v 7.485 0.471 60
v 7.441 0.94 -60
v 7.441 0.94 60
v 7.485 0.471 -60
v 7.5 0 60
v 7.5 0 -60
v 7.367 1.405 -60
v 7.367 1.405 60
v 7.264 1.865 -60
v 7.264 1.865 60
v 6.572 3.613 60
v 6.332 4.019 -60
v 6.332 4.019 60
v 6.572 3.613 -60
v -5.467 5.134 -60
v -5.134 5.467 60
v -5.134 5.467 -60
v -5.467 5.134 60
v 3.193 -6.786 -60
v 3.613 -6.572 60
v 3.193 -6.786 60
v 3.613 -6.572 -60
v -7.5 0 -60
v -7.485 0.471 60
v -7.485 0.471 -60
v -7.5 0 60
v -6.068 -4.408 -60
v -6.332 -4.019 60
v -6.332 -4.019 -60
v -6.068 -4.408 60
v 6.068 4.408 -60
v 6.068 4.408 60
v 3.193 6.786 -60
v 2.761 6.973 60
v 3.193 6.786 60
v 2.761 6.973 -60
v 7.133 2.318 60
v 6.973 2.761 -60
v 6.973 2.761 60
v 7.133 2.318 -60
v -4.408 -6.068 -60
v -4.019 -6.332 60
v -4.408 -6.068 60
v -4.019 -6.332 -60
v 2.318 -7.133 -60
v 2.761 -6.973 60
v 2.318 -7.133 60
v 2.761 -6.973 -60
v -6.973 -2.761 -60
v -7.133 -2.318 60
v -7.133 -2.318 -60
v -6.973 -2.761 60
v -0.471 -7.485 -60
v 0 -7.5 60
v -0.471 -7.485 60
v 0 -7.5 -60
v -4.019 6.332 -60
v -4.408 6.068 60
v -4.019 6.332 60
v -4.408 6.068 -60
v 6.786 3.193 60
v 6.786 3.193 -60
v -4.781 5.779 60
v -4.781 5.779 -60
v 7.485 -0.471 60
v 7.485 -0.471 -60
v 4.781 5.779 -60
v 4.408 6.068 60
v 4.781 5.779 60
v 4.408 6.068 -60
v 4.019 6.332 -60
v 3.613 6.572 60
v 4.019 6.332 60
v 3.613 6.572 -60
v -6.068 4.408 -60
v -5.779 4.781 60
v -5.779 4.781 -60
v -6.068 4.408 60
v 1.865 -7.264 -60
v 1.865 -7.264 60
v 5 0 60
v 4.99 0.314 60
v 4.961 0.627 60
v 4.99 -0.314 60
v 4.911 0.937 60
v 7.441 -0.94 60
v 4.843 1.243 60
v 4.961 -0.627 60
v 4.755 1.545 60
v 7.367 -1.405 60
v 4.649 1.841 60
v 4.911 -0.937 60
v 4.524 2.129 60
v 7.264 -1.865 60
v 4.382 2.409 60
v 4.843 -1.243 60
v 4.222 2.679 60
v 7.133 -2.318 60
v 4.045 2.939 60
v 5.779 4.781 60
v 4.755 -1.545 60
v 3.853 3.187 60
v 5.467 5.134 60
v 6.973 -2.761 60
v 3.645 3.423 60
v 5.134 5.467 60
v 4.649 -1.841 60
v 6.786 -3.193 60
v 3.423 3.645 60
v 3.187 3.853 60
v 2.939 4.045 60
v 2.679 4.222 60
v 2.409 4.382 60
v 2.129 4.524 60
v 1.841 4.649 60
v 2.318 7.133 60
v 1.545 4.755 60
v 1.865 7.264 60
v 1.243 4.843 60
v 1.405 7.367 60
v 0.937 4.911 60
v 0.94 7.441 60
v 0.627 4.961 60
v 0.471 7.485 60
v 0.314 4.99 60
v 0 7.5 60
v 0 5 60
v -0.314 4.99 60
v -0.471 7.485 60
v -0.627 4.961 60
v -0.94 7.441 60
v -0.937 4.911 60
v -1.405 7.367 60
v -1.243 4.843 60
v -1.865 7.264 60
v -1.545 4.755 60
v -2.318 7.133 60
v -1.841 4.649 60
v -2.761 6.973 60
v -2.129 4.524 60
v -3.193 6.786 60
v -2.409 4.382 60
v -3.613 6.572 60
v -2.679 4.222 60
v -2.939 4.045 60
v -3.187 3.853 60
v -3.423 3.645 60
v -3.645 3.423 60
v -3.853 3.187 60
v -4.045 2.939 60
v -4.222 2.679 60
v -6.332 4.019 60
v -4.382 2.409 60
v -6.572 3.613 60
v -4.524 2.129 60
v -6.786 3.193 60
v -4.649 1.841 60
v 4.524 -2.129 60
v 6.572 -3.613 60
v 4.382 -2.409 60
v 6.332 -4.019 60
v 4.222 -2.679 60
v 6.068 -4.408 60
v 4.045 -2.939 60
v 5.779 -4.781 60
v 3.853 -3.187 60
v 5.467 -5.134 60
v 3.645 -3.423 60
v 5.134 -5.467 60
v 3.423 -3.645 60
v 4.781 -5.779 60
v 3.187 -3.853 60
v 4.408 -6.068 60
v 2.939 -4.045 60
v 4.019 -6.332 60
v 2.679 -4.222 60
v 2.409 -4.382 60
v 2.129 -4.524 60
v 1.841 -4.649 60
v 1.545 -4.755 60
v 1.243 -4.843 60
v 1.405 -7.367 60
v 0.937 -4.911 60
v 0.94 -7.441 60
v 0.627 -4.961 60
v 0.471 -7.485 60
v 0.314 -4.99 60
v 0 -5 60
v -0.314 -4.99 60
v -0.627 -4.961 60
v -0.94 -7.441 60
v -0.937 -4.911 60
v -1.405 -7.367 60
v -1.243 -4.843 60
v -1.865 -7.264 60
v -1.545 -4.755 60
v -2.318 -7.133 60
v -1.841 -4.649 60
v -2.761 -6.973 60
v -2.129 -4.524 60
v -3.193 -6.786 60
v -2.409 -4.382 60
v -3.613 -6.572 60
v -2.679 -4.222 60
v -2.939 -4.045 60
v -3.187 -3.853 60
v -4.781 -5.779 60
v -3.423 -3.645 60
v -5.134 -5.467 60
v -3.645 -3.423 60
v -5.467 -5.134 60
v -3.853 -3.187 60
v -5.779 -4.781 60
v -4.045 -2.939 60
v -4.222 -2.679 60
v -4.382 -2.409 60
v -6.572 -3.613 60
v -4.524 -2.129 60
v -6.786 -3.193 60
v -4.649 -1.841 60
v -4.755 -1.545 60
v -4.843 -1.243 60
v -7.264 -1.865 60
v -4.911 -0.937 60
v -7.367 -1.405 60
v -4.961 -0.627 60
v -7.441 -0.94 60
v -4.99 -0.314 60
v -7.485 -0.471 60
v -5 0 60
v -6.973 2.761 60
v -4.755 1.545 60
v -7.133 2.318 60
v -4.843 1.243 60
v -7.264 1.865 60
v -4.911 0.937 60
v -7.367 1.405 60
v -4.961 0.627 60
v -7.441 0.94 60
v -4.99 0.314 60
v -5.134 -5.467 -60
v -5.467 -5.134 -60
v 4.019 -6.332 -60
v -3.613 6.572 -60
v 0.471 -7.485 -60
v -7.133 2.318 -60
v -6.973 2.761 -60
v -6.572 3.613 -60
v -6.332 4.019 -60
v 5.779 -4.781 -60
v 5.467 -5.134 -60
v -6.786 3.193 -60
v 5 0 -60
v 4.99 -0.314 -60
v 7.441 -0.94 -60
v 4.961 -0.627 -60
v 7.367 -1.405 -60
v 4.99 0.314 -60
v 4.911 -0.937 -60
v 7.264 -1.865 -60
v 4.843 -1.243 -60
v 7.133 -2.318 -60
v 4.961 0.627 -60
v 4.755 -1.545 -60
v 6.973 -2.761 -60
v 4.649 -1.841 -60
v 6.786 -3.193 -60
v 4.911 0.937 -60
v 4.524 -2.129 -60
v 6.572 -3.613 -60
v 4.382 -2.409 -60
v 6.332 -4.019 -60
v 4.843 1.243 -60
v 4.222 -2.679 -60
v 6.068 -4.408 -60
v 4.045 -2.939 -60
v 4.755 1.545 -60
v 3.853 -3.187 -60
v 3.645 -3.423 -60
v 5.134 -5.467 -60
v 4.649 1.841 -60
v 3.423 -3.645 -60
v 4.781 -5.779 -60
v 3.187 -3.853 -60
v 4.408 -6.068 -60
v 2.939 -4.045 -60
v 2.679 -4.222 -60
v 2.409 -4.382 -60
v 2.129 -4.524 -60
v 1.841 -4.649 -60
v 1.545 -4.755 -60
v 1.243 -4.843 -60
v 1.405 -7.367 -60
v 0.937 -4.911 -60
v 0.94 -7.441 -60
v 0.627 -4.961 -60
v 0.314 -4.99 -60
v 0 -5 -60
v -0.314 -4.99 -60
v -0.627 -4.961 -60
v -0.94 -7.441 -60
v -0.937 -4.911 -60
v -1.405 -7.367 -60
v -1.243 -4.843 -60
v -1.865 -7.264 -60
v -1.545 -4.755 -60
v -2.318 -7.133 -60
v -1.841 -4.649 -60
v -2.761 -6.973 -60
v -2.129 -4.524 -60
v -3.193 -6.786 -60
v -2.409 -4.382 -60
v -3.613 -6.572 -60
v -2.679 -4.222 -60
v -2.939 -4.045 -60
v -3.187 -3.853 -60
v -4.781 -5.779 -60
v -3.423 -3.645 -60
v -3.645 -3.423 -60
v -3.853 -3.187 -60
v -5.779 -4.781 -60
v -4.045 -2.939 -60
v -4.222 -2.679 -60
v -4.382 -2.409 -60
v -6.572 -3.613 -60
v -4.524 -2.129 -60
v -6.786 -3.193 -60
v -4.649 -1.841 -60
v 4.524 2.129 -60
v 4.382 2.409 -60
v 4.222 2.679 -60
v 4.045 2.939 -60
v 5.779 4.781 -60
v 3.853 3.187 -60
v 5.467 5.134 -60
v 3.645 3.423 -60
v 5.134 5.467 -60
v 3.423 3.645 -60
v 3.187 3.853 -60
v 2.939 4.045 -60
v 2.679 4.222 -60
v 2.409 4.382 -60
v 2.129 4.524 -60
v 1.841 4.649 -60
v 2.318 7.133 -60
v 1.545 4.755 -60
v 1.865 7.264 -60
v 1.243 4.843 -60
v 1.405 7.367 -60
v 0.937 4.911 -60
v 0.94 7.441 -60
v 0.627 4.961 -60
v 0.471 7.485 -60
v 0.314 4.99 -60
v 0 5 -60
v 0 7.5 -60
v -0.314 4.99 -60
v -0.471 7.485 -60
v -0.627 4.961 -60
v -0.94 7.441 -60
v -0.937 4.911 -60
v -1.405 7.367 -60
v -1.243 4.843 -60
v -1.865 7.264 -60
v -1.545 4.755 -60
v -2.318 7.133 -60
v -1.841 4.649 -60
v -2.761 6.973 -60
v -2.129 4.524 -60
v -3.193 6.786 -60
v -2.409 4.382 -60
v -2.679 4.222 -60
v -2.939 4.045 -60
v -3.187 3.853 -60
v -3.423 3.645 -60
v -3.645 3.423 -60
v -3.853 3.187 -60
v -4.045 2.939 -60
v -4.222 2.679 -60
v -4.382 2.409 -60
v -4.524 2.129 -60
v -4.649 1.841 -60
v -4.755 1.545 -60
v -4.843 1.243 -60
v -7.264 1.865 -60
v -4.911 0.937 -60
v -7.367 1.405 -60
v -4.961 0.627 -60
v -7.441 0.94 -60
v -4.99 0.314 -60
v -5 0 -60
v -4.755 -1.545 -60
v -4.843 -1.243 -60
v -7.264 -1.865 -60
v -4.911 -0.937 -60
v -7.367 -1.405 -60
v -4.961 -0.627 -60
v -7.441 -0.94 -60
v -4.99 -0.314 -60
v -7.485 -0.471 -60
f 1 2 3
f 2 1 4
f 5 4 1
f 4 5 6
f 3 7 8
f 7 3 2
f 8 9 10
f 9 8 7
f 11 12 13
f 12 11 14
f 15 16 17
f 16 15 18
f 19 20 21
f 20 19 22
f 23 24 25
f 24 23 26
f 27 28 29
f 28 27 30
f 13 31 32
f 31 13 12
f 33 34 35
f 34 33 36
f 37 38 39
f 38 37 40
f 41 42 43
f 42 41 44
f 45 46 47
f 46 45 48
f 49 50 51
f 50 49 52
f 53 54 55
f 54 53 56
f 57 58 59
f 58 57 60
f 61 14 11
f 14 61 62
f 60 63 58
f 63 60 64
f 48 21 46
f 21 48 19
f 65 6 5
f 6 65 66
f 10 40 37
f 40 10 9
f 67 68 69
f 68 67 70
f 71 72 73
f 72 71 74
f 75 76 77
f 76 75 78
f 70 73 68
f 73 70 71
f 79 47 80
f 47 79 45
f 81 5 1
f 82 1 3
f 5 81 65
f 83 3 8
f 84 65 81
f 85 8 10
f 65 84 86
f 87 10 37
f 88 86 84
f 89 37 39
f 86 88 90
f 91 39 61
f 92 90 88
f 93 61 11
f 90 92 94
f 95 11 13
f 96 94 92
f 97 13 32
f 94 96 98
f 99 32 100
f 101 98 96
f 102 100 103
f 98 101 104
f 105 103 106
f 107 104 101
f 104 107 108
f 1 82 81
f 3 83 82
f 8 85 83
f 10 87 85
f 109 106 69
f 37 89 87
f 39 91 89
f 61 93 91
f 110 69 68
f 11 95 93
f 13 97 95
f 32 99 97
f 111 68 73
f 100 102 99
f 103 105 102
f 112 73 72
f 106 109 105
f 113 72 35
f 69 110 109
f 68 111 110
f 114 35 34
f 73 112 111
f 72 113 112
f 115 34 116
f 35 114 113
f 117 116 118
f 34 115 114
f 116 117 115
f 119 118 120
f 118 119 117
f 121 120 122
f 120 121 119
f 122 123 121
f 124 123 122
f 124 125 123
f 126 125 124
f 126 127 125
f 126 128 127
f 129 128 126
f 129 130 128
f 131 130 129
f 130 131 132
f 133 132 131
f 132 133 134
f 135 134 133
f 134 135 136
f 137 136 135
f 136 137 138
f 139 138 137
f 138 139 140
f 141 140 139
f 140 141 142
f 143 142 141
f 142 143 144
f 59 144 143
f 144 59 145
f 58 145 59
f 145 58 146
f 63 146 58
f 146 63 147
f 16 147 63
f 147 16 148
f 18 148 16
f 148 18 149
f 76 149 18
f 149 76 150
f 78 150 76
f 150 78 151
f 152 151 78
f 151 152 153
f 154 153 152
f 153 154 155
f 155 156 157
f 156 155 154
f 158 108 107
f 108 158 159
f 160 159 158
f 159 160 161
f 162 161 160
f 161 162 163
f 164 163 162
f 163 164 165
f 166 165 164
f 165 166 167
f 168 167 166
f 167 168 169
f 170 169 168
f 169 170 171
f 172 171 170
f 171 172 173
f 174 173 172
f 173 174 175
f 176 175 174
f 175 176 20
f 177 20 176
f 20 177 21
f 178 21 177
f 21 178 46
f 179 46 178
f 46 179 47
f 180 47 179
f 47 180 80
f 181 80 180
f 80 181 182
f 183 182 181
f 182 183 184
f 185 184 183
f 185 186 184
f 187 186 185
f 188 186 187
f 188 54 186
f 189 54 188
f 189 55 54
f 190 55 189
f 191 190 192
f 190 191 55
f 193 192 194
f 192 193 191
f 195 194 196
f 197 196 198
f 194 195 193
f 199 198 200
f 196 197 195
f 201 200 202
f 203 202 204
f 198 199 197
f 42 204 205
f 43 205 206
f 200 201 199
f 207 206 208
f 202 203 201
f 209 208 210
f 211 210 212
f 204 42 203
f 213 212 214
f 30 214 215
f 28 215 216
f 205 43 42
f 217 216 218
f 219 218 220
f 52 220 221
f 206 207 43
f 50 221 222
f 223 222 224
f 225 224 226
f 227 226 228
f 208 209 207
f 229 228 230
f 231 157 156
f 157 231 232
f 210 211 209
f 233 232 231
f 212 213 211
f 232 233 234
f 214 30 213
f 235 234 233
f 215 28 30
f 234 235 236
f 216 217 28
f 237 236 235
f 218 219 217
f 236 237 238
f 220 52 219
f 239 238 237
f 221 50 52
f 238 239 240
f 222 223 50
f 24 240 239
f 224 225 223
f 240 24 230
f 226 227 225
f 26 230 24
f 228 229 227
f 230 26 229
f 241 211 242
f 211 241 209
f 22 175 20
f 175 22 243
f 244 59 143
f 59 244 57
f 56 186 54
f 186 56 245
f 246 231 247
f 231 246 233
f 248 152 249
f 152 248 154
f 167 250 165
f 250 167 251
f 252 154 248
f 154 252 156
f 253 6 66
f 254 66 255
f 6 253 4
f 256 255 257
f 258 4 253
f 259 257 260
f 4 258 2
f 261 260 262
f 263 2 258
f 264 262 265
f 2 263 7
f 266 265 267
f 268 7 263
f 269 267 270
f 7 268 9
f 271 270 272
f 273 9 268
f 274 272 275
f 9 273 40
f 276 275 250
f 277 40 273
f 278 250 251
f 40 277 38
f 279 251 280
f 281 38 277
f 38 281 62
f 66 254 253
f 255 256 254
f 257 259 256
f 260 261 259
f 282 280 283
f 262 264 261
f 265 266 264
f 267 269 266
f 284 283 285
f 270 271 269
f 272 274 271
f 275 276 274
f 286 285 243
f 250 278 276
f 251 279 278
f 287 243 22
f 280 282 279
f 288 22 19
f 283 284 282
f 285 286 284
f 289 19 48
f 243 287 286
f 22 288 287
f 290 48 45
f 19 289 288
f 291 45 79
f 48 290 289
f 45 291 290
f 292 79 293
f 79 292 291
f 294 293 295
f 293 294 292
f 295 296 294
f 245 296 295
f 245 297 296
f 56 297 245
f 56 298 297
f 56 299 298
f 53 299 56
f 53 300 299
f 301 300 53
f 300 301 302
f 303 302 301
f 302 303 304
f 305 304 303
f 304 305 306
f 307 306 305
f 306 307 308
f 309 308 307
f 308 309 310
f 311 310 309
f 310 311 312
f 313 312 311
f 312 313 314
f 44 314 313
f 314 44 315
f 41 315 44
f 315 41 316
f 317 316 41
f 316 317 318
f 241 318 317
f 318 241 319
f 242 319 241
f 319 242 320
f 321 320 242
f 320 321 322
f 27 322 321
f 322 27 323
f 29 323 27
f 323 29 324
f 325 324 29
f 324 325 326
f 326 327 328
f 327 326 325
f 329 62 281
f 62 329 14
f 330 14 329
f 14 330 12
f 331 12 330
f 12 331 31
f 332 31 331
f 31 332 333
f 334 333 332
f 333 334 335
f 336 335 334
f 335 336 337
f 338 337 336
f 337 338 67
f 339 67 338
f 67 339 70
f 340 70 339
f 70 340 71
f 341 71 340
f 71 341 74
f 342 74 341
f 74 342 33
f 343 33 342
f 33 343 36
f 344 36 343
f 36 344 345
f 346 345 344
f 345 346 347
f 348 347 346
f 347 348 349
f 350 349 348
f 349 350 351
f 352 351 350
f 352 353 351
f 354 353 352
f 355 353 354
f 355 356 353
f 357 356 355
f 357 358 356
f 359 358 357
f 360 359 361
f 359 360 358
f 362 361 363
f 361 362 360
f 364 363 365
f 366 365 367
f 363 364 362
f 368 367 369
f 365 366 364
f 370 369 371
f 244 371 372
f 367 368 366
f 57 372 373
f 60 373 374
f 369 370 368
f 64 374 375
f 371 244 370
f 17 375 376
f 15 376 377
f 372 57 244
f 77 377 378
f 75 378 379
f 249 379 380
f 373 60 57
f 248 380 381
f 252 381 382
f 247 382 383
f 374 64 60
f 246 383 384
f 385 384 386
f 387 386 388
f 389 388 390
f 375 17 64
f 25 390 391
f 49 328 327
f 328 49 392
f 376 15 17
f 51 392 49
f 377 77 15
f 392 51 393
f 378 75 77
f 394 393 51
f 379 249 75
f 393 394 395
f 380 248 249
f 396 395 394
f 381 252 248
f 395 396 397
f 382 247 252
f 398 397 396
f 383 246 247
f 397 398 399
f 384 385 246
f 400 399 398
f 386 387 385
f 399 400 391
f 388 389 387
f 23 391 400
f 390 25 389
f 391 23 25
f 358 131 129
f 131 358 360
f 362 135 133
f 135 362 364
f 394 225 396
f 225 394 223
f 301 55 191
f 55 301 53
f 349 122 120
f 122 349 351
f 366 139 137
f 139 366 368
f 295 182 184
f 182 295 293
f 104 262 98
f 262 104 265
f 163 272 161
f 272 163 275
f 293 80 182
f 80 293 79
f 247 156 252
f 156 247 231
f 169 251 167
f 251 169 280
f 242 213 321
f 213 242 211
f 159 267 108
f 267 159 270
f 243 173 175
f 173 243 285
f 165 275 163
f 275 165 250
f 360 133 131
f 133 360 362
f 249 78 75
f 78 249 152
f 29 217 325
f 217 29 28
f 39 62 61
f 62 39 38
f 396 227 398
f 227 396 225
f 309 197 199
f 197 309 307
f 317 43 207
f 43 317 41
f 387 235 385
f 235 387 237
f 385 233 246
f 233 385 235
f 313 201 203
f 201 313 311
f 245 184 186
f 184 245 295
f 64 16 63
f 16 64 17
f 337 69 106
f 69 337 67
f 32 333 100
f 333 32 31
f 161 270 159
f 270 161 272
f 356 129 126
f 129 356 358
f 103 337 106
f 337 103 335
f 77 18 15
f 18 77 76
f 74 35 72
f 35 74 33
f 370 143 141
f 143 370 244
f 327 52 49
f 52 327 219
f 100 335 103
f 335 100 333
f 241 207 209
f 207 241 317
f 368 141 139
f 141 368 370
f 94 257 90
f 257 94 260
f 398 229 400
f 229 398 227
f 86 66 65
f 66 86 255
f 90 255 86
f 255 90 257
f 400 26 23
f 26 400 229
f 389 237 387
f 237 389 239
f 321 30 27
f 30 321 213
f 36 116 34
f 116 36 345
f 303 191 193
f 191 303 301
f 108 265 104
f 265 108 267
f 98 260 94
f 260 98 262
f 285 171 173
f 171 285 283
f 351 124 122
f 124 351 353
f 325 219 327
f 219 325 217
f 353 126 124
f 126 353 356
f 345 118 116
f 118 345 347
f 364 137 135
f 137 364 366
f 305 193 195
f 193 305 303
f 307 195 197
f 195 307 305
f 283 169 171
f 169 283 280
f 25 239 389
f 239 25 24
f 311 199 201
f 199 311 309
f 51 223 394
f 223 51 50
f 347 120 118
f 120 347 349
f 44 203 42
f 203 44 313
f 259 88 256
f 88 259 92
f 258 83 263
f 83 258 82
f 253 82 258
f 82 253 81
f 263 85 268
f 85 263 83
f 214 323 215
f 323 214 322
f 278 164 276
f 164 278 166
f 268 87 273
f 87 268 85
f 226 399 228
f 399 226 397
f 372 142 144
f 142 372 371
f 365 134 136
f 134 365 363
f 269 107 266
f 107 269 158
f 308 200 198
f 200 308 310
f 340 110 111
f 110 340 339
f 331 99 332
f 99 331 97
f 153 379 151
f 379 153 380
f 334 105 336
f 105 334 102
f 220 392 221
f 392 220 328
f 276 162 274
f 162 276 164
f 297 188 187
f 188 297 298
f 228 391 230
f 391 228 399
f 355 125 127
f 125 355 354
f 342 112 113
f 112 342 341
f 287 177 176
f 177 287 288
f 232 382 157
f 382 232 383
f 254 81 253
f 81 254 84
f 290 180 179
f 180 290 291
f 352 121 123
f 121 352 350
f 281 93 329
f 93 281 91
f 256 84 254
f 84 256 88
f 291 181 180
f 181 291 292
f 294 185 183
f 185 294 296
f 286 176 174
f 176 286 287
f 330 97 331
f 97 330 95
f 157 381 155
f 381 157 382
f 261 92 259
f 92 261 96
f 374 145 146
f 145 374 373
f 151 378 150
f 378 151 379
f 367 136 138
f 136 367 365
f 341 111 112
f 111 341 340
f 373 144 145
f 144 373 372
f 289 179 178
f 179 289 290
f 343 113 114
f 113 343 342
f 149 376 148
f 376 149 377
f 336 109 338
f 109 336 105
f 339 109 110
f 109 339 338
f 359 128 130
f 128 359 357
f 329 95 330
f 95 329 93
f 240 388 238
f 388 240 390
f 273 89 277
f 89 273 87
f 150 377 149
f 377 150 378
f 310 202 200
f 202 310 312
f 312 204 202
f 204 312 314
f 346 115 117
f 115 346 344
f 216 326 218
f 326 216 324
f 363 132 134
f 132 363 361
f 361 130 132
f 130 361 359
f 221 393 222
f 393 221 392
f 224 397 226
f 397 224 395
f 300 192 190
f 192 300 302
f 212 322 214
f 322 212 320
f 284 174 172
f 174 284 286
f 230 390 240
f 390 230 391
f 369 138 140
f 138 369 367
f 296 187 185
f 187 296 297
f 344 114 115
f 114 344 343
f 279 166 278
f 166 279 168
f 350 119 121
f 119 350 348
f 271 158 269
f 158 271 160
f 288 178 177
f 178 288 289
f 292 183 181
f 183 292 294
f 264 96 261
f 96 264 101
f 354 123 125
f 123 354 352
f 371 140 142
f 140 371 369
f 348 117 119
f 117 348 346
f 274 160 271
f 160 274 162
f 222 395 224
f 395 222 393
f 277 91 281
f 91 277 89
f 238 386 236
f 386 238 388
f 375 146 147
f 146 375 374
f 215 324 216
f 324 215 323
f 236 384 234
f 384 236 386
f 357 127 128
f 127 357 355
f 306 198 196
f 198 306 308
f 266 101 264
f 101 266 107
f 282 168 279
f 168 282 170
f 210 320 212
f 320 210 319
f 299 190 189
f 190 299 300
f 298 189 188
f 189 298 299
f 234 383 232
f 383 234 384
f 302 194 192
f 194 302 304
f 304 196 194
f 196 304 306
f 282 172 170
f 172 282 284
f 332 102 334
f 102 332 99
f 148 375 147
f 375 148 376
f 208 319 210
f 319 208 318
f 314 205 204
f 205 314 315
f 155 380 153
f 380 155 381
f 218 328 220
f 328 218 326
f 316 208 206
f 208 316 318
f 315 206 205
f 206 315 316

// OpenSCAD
difference(){
    cylinder(h=120, r=7.5, $fn=100, center=true);
    cylinder(h=200, r=5, $fn=100, center=true);
}
